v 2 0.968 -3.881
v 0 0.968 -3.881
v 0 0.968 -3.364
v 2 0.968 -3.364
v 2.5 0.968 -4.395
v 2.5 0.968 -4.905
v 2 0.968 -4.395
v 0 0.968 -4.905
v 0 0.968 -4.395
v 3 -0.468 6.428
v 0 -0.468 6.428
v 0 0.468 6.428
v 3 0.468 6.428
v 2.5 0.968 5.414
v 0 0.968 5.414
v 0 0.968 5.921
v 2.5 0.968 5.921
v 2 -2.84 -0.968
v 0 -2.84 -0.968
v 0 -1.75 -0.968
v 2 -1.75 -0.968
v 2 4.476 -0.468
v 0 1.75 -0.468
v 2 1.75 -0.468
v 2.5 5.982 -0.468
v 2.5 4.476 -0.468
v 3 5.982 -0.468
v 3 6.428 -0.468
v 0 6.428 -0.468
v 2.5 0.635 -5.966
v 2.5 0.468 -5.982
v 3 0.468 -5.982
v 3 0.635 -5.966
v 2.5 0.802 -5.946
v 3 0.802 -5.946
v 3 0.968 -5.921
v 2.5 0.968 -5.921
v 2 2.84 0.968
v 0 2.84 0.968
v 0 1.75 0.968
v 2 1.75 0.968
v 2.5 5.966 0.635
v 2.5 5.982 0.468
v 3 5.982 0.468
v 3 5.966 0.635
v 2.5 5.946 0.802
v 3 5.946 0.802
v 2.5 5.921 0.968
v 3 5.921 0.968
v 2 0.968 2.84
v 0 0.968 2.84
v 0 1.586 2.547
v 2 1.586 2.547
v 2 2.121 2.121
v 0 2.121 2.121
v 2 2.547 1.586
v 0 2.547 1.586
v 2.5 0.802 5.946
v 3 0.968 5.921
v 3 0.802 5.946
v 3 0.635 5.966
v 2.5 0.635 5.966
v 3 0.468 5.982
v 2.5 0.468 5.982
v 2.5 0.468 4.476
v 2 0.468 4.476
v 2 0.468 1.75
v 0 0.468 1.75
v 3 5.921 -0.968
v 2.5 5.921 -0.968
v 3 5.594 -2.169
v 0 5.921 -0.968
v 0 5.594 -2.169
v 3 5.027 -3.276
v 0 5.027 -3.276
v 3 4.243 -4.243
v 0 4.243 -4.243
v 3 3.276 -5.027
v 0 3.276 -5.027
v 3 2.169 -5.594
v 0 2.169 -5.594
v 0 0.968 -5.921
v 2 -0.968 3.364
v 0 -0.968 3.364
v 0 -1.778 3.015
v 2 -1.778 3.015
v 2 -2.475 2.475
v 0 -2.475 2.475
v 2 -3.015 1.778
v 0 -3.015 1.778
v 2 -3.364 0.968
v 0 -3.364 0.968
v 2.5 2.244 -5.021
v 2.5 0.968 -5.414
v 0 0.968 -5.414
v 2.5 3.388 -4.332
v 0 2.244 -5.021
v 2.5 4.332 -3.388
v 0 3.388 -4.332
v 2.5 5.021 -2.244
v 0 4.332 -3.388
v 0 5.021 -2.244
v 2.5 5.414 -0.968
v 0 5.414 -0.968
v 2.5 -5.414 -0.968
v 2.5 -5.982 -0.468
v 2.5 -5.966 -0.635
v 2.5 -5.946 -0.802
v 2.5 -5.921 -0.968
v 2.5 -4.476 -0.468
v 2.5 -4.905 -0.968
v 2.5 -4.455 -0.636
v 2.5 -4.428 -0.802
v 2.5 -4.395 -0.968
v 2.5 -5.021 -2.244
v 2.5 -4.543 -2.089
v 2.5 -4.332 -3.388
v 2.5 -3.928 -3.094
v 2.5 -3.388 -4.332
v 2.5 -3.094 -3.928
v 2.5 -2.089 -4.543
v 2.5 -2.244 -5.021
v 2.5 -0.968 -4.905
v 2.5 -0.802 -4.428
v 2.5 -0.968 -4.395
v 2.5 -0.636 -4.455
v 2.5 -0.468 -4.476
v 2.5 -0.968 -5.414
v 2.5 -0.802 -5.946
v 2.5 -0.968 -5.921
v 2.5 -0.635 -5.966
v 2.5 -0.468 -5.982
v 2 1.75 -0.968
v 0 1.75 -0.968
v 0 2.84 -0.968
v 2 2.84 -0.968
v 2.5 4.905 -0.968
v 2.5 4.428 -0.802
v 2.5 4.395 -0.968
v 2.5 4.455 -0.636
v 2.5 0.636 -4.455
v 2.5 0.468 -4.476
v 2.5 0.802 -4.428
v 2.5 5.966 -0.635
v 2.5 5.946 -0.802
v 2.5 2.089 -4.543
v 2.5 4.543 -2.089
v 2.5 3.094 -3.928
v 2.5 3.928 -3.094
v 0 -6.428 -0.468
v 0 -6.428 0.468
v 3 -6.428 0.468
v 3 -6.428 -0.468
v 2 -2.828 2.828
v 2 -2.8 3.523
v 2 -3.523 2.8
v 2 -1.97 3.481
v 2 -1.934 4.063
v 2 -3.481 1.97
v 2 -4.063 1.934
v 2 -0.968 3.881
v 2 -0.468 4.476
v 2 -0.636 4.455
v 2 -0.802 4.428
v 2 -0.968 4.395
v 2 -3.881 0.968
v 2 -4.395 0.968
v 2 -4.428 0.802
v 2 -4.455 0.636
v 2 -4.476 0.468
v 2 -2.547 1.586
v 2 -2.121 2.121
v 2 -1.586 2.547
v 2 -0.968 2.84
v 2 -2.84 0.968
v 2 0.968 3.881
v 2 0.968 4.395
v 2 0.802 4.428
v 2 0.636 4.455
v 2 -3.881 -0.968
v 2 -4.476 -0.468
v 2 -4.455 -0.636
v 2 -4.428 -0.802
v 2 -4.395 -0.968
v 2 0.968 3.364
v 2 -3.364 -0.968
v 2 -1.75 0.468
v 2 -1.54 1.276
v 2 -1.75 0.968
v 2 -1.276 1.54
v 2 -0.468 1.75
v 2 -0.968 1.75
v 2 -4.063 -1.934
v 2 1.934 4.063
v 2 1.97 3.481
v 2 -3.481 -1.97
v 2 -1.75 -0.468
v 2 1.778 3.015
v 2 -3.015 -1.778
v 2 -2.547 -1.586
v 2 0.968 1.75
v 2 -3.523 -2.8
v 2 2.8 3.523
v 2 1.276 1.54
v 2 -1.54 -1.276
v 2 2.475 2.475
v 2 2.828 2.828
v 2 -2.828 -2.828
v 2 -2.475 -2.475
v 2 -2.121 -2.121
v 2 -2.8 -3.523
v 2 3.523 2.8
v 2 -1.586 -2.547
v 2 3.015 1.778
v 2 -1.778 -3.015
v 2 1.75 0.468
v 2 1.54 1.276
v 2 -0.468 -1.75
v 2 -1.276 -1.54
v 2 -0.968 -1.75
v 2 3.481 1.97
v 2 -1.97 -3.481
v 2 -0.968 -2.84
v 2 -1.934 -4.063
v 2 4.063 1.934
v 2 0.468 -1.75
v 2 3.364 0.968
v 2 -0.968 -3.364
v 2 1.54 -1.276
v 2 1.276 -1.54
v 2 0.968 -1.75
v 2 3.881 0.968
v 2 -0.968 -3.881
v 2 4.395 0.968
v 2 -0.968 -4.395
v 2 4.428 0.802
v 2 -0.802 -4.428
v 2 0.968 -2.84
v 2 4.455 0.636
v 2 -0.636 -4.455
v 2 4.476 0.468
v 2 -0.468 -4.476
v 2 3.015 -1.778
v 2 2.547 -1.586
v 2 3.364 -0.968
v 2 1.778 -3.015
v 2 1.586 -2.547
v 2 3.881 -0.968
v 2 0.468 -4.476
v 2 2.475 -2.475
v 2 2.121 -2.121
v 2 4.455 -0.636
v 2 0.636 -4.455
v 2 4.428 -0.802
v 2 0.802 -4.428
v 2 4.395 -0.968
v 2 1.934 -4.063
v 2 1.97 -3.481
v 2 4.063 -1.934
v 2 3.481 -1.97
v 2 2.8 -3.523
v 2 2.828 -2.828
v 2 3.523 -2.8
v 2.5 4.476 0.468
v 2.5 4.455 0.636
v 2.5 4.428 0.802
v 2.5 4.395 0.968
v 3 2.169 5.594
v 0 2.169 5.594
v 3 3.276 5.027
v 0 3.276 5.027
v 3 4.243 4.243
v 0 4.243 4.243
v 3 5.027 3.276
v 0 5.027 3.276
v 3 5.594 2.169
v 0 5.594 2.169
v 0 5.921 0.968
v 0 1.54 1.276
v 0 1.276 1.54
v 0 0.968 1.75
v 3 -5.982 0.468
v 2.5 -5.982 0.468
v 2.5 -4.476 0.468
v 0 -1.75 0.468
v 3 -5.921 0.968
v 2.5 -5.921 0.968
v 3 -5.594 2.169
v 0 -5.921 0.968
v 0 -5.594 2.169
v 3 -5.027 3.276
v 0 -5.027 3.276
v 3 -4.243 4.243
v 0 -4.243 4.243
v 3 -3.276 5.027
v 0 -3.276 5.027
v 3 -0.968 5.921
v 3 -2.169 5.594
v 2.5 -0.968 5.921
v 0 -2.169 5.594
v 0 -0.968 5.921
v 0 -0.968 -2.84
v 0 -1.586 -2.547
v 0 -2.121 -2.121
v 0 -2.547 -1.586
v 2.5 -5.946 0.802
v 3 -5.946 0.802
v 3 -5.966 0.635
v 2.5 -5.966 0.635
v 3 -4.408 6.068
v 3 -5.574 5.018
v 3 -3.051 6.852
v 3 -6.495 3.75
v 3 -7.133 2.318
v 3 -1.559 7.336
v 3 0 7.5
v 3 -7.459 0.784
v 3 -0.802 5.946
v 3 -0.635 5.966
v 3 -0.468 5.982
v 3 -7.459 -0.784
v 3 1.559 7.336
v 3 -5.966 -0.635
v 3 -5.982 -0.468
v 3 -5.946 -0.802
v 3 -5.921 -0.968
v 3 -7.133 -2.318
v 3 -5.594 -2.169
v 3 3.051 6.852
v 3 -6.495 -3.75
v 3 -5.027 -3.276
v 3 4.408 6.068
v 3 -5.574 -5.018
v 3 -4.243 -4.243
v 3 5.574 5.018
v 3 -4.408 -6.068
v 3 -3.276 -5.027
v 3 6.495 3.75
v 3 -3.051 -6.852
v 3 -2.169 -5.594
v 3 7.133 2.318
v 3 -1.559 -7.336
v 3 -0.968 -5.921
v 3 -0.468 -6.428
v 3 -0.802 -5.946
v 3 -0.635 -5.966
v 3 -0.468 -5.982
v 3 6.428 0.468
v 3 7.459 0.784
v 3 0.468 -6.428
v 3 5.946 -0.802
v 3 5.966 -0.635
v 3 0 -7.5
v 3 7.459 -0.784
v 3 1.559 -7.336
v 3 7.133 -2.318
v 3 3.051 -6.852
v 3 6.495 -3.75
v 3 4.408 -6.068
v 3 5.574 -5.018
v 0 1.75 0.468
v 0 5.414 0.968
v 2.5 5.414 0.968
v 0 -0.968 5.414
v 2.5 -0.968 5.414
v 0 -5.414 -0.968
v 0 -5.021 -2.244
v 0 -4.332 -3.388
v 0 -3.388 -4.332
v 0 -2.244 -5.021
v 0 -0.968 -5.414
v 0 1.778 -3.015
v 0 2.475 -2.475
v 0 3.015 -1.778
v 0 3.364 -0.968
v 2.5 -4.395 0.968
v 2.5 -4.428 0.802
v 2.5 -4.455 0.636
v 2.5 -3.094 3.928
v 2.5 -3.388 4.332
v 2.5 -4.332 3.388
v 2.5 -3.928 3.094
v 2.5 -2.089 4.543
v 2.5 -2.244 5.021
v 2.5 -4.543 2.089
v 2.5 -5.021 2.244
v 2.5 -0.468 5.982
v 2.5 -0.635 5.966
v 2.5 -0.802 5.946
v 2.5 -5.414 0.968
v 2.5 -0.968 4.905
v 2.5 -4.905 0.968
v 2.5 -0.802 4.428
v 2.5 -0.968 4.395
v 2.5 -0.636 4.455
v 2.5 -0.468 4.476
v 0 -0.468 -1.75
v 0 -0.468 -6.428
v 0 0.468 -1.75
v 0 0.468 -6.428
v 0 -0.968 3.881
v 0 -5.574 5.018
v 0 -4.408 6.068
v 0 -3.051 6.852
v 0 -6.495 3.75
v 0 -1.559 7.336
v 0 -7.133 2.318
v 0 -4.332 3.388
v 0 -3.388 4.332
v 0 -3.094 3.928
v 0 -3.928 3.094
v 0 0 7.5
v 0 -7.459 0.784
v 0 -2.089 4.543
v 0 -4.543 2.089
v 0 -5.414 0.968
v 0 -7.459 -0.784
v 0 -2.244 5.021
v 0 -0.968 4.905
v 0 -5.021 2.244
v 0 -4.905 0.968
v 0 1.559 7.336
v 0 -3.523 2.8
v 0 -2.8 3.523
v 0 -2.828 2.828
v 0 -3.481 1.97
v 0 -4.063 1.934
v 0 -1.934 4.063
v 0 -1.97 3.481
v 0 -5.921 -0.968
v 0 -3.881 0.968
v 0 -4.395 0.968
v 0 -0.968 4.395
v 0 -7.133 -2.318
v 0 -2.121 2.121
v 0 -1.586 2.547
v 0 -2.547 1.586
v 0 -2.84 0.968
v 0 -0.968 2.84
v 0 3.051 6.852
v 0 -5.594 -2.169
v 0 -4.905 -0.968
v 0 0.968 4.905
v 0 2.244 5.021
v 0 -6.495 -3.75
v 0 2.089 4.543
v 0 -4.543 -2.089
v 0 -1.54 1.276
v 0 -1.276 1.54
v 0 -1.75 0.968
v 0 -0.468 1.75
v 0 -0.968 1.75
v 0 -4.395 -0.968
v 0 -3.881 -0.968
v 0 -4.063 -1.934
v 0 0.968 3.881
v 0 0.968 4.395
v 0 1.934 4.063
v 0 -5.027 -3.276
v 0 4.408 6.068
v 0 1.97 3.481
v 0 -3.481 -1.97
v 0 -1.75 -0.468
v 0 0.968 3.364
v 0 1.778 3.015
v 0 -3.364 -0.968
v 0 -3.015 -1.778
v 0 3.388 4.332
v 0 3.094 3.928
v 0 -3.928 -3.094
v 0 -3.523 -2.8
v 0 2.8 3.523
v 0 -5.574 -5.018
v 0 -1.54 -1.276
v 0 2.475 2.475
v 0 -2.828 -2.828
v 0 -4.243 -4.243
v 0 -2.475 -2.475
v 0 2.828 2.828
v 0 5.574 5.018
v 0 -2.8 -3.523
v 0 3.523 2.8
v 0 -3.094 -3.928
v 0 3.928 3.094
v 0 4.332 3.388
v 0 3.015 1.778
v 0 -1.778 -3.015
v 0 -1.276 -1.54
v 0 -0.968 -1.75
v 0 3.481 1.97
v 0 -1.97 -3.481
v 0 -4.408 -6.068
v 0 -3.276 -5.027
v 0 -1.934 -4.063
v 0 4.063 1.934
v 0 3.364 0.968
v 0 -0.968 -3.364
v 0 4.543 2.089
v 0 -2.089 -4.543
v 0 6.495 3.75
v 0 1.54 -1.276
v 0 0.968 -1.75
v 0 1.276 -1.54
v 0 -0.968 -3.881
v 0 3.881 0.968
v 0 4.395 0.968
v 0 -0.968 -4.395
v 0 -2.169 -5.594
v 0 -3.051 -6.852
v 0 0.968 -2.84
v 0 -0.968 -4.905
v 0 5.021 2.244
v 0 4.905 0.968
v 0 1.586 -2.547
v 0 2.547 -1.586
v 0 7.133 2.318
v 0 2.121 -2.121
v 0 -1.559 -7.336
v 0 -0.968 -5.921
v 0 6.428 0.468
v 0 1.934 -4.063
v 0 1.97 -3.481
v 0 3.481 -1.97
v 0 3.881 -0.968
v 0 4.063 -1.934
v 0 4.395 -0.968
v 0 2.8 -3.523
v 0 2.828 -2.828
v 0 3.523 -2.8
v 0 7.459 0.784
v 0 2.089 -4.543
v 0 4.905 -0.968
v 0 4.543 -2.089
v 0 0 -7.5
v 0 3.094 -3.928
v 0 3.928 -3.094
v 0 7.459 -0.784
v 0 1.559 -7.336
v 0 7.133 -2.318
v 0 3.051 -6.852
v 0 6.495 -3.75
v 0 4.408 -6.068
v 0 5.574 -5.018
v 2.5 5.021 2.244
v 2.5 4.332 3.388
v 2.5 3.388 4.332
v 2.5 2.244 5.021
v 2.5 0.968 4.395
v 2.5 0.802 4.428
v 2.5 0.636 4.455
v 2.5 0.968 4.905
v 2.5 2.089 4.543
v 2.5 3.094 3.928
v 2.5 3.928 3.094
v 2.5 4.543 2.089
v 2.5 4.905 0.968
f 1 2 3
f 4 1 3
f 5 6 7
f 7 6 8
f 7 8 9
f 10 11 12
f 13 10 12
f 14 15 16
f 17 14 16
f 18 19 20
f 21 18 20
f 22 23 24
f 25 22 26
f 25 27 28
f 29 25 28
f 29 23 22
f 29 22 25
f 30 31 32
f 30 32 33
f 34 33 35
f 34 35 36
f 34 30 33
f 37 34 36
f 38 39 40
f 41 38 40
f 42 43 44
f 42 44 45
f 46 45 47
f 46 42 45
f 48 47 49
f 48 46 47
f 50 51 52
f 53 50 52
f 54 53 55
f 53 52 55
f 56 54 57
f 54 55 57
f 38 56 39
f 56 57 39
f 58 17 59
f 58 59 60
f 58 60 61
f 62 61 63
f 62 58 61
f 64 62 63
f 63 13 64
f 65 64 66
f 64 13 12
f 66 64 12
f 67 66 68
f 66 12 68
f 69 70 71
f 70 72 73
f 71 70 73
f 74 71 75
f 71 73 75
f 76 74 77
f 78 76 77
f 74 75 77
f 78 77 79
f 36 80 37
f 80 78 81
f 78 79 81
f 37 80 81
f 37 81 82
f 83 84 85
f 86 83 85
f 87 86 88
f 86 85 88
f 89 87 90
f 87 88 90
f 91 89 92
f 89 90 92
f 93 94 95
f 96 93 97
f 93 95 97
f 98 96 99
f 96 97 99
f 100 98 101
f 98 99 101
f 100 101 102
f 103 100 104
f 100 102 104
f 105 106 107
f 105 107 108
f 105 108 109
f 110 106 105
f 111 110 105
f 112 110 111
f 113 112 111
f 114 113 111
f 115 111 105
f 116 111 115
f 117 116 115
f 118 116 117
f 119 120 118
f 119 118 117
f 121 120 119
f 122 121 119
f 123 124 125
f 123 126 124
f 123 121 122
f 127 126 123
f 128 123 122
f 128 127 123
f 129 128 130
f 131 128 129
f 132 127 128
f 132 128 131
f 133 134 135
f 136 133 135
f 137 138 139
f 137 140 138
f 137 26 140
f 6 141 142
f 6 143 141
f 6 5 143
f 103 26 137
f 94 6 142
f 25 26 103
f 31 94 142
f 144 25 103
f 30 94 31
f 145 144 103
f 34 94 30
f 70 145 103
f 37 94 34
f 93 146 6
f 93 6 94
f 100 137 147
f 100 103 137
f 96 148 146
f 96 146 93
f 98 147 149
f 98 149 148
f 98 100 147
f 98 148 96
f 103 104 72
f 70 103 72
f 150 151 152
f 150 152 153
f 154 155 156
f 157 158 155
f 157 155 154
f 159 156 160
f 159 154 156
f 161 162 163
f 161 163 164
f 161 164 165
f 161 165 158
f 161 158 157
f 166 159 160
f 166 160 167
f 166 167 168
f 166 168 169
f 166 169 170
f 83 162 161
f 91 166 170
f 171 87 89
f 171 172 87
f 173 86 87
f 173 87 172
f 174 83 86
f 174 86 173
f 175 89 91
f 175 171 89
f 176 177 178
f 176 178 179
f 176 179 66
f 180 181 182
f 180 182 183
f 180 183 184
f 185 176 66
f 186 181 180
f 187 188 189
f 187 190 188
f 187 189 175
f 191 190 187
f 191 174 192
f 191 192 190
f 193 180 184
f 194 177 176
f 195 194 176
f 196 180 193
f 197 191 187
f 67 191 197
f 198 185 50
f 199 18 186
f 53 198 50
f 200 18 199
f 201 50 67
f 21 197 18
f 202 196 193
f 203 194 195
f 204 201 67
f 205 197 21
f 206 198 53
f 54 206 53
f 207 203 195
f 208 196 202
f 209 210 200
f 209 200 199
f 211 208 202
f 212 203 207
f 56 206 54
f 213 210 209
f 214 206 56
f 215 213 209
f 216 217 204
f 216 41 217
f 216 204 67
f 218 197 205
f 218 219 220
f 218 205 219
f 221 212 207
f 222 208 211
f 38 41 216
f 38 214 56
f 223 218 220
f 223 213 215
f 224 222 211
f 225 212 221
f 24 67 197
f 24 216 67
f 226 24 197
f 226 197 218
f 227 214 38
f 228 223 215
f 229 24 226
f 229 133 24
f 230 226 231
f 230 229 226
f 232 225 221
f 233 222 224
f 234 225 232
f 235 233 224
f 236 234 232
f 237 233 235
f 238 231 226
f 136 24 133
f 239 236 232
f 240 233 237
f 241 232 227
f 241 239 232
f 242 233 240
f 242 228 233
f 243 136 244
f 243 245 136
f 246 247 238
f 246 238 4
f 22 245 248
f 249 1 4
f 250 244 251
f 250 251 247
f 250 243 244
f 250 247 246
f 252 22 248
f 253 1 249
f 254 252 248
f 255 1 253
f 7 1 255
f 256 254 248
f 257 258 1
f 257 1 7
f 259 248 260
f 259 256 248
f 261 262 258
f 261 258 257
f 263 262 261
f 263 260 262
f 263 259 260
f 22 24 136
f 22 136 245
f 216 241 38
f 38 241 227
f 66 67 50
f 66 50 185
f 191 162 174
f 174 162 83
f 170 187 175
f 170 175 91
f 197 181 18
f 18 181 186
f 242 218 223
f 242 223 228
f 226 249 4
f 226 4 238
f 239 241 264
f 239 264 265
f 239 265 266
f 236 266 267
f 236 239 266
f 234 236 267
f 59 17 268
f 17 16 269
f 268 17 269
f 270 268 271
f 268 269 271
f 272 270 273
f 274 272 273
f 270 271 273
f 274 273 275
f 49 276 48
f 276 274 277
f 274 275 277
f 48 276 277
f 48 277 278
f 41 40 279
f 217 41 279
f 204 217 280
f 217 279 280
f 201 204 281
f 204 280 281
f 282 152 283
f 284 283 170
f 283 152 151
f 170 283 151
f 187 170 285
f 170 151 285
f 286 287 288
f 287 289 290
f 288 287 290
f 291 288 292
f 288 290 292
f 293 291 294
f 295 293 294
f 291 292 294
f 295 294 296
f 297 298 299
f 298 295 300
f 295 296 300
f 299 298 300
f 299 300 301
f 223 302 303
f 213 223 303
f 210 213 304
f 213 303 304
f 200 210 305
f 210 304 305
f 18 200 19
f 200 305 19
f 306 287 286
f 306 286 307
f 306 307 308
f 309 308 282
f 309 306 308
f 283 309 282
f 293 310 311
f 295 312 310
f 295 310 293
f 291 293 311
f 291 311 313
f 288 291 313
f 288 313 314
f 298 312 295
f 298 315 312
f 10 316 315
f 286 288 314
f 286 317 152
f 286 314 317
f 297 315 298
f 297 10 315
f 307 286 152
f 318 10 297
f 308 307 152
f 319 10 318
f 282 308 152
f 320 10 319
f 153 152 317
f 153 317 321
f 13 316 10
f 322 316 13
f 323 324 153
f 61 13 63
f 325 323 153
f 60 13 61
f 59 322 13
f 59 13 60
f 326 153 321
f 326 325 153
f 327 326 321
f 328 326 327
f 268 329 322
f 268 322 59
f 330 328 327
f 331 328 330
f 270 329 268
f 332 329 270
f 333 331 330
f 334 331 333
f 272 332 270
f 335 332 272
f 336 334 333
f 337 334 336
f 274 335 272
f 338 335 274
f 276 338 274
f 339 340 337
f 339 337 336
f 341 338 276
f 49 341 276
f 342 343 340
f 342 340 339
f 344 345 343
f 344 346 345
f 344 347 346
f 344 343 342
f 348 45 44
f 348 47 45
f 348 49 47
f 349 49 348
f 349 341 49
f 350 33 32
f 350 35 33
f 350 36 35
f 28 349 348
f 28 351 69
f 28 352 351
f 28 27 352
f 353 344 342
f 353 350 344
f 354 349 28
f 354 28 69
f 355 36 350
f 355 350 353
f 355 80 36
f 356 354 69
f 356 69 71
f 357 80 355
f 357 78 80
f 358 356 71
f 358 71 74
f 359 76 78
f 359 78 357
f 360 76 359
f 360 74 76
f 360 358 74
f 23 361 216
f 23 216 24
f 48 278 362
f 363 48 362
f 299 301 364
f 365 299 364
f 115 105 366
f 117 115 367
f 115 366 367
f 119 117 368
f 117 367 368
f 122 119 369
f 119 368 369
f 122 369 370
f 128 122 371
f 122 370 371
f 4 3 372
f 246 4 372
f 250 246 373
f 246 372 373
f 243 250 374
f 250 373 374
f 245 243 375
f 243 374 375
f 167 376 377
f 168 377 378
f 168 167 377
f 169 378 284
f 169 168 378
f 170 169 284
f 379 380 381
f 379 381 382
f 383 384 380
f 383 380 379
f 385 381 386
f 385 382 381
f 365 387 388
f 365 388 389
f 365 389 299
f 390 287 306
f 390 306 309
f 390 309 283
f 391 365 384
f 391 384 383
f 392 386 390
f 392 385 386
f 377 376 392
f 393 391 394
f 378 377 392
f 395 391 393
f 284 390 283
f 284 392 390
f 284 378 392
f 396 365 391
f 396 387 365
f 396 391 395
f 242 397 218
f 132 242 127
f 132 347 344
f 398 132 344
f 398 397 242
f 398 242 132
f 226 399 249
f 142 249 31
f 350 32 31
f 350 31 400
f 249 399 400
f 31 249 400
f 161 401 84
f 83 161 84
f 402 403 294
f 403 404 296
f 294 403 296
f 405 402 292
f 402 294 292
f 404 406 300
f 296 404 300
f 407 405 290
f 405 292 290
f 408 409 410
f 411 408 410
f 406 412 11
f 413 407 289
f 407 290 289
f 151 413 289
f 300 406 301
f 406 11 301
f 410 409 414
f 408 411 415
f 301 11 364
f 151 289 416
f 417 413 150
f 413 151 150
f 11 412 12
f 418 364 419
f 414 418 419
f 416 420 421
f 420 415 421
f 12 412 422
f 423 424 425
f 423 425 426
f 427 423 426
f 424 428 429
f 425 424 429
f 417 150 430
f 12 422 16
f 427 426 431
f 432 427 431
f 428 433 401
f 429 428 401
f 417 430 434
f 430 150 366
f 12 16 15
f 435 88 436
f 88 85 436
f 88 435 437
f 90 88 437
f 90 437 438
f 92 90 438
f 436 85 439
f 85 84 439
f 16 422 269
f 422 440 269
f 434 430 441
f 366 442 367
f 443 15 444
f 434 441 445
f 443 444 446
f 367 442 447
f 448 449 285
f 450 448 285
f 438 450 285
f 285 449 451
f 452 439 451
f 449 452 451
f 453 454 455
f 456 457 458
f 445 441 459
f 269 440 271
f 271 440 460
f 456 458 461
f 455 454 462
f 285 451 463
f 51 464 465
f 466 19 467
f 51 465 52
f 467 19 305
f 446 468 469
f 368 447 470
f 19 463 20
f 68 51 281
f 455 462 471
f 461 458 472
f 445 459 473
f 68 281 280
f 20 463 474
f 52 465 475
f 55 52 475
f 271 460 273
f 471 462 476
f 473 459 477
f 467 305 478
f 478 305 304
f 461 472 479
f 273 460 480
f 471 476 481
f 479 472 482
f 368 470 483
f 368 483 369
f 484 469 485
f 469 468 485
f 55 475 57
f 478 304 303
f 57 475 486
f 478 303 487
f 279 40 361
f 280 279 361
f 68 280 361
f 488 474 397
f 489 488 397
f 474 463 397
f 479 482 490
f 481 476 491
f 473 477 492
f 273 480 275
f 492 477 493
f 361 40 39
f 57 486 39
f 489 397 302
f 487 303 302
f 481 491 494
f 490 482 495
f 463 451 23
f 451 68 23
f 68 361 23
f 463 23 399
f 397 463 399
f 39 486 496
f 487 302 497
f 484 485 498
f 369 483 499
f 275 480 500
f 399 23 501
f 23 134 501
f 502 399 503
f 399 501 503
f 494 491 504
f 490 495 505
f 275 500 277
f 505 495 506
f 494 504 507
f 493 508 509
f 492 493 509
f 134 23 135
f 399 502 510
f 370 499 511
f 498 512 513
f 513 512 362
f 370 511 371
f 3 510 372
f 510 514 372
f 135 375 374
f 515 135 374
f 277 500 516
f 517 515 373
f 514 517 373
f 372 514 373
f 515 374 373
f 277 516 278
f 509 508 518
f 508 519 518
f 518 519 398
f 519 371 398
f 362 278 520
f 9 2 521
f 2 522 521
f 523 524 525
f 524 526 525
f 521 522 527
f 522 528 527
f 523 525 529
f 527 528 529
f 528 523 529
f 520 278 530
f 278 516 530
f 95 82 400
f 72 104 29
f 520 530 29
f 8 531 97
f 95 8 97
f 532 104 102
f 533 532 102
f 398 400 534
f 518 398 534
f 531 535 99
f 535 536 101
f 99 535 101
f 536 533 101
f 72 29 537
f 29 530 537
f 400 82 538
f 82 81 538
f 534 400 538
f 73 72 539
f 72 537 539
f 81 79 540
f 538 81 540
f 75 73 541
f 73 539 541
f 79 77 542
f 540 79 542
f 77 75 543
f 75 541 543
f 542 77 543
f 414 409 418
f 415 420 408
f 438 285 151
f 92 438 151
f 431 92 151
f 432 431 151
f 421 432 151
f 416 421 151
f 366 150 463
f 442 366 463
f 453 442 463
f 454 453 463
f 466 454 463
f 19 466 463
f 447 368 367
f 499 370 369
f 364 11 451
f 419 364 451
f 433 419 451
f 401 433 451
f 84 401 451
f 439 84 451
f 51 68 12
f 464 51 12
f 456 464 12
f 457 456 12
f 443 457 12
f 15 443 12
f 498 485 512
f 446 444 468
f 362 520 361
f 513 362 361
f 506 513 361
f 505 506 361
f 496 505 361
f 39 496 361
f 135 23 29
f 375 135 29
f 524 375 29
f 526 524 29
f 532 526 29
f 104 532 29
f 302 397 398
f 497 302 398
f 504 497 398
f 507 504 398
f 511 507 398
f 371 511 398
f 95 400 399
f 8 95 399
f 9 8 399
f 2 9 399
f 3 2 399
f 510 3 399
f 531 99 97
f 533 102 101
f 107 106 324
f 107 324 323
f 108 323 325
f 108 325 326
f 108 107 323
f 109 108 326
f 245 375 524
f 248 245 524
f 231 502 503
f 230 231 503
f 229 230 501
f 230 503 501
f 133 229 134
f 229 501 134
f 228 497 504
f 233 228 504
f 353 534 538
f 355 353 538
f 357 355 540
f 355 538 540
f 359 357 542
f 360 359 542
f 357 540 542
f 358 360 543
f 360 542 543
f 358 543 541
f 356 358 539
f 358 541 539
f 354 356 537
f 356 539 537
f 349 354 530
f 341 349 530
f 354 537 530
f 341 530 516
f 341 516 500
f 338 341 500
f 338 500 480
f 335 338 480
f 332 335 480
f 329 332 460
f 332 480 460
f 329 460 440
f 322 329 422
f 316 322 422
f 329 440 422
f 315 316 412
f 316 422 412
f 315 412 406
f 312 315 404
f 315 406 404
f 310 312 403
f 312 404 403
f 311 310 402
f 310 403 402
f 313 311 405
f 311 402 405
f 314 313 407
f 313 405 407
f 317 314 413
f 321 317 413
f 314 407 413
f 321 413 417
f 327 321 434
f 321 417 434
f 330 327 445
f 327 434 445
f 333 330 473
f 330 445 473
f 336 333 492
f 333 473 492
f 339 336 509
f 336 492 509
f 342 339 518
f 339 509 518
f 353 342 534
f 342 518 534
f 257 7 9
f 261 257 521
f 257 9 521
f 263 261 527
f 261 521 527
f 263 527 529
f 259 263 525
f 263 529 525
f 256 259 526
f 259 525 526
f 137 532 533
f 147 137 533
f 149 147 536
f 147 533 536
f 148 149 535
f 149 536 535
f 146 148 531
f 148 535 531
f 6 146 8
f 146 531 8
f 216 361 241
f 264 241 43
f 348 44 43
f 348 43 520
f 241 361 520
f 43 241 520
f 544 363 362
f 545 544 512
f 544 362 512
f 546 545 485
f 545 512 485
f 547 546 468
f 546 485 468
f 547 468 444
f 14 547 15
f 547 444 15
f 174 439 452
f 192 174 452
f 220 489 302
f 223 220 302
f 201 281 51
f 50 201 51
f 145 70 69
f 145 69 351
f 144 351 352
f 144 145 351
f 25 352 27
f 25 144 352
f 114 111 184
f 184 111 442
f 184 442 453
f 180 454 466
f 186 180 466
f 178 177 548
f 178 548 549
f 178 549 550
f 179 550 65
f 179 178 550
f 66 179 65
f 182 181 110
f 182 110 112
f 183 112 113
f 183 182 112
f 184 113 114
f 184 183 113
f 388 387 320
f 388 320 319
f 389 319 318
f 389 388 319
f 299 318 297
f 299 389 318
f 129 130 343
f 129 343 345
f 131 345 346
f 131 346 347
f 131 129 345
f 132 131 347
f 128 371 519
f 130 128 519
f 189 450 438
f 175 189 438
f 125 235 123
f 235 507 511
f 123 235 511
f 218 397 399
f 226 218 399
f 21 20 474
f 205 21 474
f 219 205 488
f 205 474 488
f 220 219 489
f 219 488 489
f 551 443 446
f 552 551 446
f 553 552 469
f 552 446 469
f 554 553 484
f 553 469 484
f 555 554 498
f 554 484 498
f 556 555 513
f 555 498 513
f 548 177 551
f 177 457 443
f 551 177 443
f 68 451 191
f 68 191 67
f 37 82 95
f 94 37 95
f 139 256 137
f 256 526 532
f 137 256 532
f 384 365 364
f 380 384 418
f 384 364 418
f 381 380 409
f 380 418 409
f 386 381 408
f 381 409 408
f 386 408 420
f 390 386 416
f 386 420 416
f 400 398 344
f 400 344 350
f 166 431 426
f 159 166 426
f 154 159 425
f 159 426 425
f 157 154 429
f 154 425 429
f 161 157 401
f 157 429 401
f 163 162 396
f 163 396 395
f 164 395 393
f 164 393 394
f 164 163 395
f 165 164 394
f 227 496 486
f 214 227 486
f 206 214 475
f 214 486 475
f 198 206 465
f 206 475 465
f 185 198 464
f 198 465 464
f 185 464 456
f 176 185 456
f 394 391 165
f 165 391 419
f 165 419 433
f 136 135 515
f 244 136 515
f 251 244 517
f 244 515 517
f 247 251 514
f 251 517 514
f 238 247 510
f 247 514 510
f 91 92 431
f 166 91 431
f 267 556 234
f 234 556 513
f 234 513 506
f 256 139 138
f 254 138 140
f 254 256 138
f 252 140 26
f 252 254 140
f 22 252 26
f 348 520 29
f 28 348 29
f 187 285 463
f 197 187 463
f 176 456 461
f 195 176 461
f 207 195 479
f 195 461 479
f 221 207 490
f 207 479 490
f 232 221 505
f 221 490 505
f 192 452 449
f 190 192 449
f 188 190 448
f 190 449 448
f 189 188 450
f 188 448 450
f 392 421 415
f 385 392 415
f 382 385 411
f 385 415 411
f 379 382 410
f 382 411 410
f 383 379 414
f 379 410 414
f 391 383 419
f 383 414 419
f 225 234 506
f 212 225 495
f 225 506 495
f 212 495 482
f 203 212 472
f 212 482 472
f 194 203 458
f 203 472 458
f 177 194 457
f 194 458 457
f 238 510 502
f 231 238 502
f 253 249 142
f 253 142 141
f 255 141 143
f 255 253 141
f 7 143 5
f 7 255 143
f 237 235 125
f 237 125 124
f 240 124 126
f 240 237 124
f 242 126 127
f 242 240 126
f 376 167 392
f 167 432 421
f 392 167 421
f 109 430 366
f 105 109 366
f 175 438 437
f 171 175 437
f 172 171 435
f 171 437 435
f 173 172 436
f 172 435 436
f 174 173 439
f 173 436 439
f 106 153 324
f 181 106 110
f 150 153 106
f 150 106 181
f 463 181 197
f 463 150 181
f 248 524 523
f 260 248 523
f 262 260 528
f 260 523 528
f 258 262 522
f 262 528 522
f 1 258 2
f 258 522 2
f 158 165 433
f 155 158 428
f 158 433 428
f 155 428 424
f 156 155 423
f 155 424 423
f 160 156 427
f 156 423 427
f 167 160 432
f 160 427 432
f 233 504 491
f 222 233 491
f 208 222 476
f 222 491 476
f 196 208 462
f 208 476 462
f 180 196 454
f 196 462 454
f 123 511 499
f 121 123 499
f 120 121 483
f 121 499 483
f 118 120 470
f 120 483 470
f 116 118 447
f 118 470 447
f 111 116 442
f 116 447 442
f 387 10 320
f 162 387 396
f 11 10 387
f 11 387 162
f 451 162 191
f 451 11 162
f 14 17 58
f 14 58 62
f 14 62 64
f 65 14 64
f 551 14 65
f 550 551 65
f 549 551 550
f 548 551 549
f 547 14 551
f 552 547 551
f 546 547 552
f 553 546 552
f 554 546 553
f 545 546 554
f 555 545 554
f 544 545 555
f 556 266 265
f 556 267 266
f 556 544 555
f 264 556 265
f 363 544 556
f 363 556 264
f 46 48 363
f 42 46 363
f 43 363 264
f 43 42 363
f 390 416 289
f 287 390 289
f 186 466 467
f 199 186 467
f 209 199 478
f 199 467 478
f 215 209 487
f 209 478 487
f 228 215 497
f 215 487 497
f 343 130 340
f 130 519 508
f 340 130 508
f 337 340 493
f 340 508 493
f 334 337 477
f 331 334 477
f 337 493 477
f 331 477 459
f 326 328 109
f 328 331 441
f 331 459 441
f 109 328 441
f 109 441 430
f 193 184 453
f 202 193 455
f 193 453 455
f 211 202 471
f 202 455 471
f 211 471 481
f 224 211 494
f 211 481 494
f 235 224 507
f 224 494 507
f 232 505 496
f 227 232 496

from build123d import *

# Parameters (mm, degrees)
SKETCH1_R           = 7.5
SKETCH1_W           = 0.935836939
SKETCH1_H           = 4.677443156
SKETCH1_W_2         = 4.677419546
SKETCH1_H_2         = 0.93583693
BOSS_EXTRUDE1_DEPTH = 3
CUT_EXTRUDE1_START  = -0.5
SKETCH2_R           = 6
CUT_EXTRUDE1_DEPTH  = 0.5
CUT_EXTRUDE2_START  = -0.5
SKETCH3_R           = 4.5
CUT_EXTRUDE2_DEPTH  = 0.5


with BuildPart() as part:
    # Sketch1 → Boss-Extrude1 (new body)
    with BuildSketch(Plane(origin=(0, 0, 0), x_dir=(0, 0, -1), z_dir=(1, 0, 0))):
        Circle(SKETCH1_R)
        with BuildLine():
            Line((-0.967918465, 2.839565785), (-0.967918465, 1.750181089))
            ThreePointArc((-0.967918465, 1.750181089), (-1.414213562, 1.414213562), (-1.750181089, 0.967918465))
            Line((-1.750181089, 0.967918465), (-2.839565785, 0.967918465))
            ThreePointArc((-2.839565785, 0.967918465), (-2.121320344, 2.121320344), (-0.967918465, 2.839565785))
        make_face(mode=Mode.SUBTRACT)
        with BuildLine():
            Line((-0.967918465, 3.881125332), (-0.967918465, 3.363500237))
            ThreePointArc((-0.967918465, 3.363500237), (-2.474873734, 2.474873734), (-3.363500237, 0.967918465))
            Line((-3.363500237, 0.967918465), (-3.881125332, 0.967918465))
            ThreePointArc((-3.881125332, 0.967918465), (-2.828427125, 2.828427125), (-0.967918465, 3.881125332))
        make_face(mode=Mode.SUBTRACT)
        with BuildLine():
            Line((-0.967918465, 4.905418825), (-0.967918465, 4.394671074))
            ThreePointArc((-0.967918465, 4.394671074), (-3.181980515, 3.181980515), (-4.394671074, 0.967918465))
            Line((-4.394671074, 0.967918465), (-4.905418825, 0.967918465))
            ThreePointArc((-4.905418825, 0.967918465), (-3.535533906, 3.535533906), (-0.967918465, 4.905418825))
        make_face(mode=Mode.SUBTRACT)
        with BuildLine():
            Line((-0.967918465, 5.921413163), (-0.967918465, 5.414160493))
            ThreePointArc((-0.967918465, 5.414160493), (-3.889087297, 3.889087297), (-5.414160493, 0.967918465))
            Line((-5.414160493, 0.967918465), (-5.921413163, 0.967918465))
            ThreePointArc((-5.921413163, 0.967918465), (-4.242640687, 4.242640687), (-0.967918465, 5.921413163))
        make_face(mode=Mode.SUBTRACT)
        with Locations((-5e-09, 4.088902667)):
            Rectangle(SKETCH1_W, SKETCH1_H, mode=Mode.SUBTRACT)
        with Locations((-4.088890862, 0)):
            Rectangle(SKETCH1_W_2, SKETCH1_H_2, mode=Mode.SUBTRACT)
        with Locations((-5e-09, -4.088902667)):
            Rectangle(SKETCH1_W, SKETCH1_H, mode=Mode.SUBTRACT)
        with Locations((4.088890862, 0)):
            Rectangle(SKETCH1_W_2, SKETCH1_H_2, mode=Mode.SUBTRACT)
        with BuildLine():
            ThreePointArc((1.750181089, 0.967918465), (1.414213562, 1.414213562), (0.967918465, 1.750181089))
            Line((0.967918465, 1.750181089), (0.967918465, 2.839565785))
            ThreePointArc((0.967918465, 2.839565785), (2.121320344, 2.121320344), (2.839565785, 0.967918465))
            Line((2.839565785, 0.967918465), (1.750181089, 0.967918465))
        make_face(mode=Mode.SUBTRACT)
        with BuildLine():
            ThreePointArc((0.967918465, -1.750181089), (1.414213562, -1.414213562), (1.750181089, -0.967918465))
            Line((1.750181089, -0.967918465), (2.839565785, -0.967918465))
            ThreePointArc((2.839565785, -0.967918465), (2.121320344, -2.121320344), (0.967918465, -2.839565785))
            Line((0.967918465, -2.839565785), (0.967918465, -1.750181089))
        make_face(mode=Mode.SUBTRACT)
        with BuildLine():
            ThreePointArc((-1.750181089, -0.967918465), (-1.414213562, -1.414213562), (-0.967918465, -1.750181089))
            Line((-0.967918465, -1.750181089), (-0.967918465, -2.839565785))
            ThreePointArc((-0.967918465, -2.839565785), (-2.121320344, -2.121320344), (-2.839565785, -0.967918465))
            Line((-2.839565785, -0.967918465), (-1.750181089, -0.967918465))
        make_face(mode=Mode.SUBTRACT)
        with BuildLine():
            Line((0.967918465, 5.414160493), (0.967918465, 5.921413163))
            ThreePointArc((0.967918465, 5.921413163), (4.242640687, 4.242640687), (5.921413163, 0.967918465))
            Line((5.921413163, 0.967918465), (5.414160493, 0.967918465))
            ThreePointArc((5.414160493, 0.967918465), (3.889087297, 3.889087297), (0.967918465, 5.414160493))
        make_face(mode=Mode.SUBTRACT)
        with BuildLine():
            Line((0.967918465, 4.394671074), (0.967918465, 4.905418825))
            ThreePointArc((0.967918465, 4.905418825), (3.535533906, 3.535533906), (4.905418825, 0.967918465))
            Line((4.905418825, 0.967918465), (4.394671074, 0.967918465))
            ThreePointArc((4.394671074, 0.967918465), (3.181980515, 3.181980515), (0.967918465, 4.394671074))
        make_face(mode=Mode.SUBTRACT)
        with BuildLine():
            Line((0.967918465, 3.363500237), (0.967918465, 3.881125332))
            ThreePointArc((0.967918465, 3.881125332), (2.828427125, 2.828427125), (3.881125332, 0.967918465))
            Line((3.881125332, 0.967918465), (3.363500237, 0.967918465))
            ThreePointArc((3.363500237, 0.967918465), (2.474873734, 2.474873734), (0.967918465, 3.363500237))
        make_face(mode=Mode.SUBTRACT)
        with BuildLine():
            Line((-3.881125332, -0.967918465), (-3.363500237, -0.967918465))
            ThreePointArc((-3.363500237, -0.967918465), (-2.474873734, -2.474873734), (-0.967918465, -3.363500237))
            Line((-0.967918465, -3.363500237), (-0.967918465, -3.881125332))
            ThreePointArc((-0.967918465, -3.881125332), (-2.828427125, -2.828427125), (-3.881125332, -0.967918465))
        make_face(mode=Mode.SUBTRACT)
        with BuildLine():
            Line((-4.905418825, -0.967918465), (-4.394671074, -0.967918465))
            ThreePointArc((-4.394671074, -0.967918465), (-3.181980515, -3.181980515), (-0.967918465, -4.394671074))
            Line((-0.967918465, -4.394671074), (-0.967918465, -4.905418825))
            ThreePointArc((-0.967918465, -4.905418825), (-3.535533906, -3.535533906), (-4.905418825, -0.967918465))
        make_face(mode=Mode.SUBTRACT)
        with BuildLine():
            Line((-5.921413163, -0.967918465), (-5.414160493, -0.967918465))
            ThreePointArc((-5.414160493, -0.967918465), (-3.889087297, -3.889087297), (-0.967918465, -5.414160493))
            Line((-0.967918465, -5.414160493), (-0.967918465, -5.921413163))
            ThreePointArc((-0.967918465, -5.921413163), (-4.242640687, -4.242640687), (-5.921413163, -0.967918465))
        make_face(mode=Mode.SUBTRACT)
        with BuildLine():
            Line((0.967918465, -3.881125332), (0.967918465, -3.363500237))
            ThreePointArc((0.967918465, -3.363500237), (2.474873734, -2.474873734), (3.363500237, -0.967918465))
            Line((3.363500237, -0.967918465), (3.881125332, -0.967918465))
            ThreePointArc((3.881125332, -0.967918465), (2.828427125, -2.828427125), (0.967918465, -3.881125332))
        make_face(mode=Mode.SUBTRACT)
        with BuildLine():
            Line((0.967918465, -4.905418825), (0.967918465, -4.394671074))
            ThreePointArc((0.967918465, -4.394671074), (3.181980515, -3.181980515), (4.394671074, -0.967918465))
            Line((4.394671074, -0.967918465), (4.905418825, -0.967918465))
            ThreePointArc((4.905418825, -0.967918465), (3.535533906, -3.535533906), (0.967918465, -4.905418825))
        make_face(mode=Mode.SUBTRACT)
        with BuildLine():
            Line((0.967918465, -5.921413163), (0.967918465, -5.414160493))
            ThreePointArc((0.967918465, -5.414160493), (3.889087297, -3.889087297), (5.414160493, -0.967918465))
            Line((5.414160493, -0.967918465), (5.921413163, -0.967918465))
            ThreePointArc((5.921413163, -0.967918465), (4.242640687, -4.242640687), (0.967918465, -5.921413163))
        make_face(mode=Mode.SUBTRACT)
    extrude(amount=BOSS_EXTRUDE1_DEPTH)

    # Sketch2 → Cut-Extrude1 (cut)
    with BuildSketch(Plane(origin=(3, 0, 0), x_dir=(0, 0, -1), z_dir=(1, 0, 0)).offset(CUT_EXTRUDE1_START)):
        Circle(SKETCH2_R)
    extrude(amount=CUT_EXTRUDE1_DEPTH, mode=Mode.SUBTRACT)

    # Sketch3 → Cut-Extrude2 (cut)
    with BuildSketch(Plane(origin=(2.5, 0, 0), x_dir=(0, 0, -1), z_dir=(1, 0, 0)).offset(CUT_EXTRUDE2_START)):
        Circle(SKETCH3_R)
    extrude(amount=CUT_EXTRUDE2_DEPTH, mode=Mode.SUBTRACT)


solid = part.part
